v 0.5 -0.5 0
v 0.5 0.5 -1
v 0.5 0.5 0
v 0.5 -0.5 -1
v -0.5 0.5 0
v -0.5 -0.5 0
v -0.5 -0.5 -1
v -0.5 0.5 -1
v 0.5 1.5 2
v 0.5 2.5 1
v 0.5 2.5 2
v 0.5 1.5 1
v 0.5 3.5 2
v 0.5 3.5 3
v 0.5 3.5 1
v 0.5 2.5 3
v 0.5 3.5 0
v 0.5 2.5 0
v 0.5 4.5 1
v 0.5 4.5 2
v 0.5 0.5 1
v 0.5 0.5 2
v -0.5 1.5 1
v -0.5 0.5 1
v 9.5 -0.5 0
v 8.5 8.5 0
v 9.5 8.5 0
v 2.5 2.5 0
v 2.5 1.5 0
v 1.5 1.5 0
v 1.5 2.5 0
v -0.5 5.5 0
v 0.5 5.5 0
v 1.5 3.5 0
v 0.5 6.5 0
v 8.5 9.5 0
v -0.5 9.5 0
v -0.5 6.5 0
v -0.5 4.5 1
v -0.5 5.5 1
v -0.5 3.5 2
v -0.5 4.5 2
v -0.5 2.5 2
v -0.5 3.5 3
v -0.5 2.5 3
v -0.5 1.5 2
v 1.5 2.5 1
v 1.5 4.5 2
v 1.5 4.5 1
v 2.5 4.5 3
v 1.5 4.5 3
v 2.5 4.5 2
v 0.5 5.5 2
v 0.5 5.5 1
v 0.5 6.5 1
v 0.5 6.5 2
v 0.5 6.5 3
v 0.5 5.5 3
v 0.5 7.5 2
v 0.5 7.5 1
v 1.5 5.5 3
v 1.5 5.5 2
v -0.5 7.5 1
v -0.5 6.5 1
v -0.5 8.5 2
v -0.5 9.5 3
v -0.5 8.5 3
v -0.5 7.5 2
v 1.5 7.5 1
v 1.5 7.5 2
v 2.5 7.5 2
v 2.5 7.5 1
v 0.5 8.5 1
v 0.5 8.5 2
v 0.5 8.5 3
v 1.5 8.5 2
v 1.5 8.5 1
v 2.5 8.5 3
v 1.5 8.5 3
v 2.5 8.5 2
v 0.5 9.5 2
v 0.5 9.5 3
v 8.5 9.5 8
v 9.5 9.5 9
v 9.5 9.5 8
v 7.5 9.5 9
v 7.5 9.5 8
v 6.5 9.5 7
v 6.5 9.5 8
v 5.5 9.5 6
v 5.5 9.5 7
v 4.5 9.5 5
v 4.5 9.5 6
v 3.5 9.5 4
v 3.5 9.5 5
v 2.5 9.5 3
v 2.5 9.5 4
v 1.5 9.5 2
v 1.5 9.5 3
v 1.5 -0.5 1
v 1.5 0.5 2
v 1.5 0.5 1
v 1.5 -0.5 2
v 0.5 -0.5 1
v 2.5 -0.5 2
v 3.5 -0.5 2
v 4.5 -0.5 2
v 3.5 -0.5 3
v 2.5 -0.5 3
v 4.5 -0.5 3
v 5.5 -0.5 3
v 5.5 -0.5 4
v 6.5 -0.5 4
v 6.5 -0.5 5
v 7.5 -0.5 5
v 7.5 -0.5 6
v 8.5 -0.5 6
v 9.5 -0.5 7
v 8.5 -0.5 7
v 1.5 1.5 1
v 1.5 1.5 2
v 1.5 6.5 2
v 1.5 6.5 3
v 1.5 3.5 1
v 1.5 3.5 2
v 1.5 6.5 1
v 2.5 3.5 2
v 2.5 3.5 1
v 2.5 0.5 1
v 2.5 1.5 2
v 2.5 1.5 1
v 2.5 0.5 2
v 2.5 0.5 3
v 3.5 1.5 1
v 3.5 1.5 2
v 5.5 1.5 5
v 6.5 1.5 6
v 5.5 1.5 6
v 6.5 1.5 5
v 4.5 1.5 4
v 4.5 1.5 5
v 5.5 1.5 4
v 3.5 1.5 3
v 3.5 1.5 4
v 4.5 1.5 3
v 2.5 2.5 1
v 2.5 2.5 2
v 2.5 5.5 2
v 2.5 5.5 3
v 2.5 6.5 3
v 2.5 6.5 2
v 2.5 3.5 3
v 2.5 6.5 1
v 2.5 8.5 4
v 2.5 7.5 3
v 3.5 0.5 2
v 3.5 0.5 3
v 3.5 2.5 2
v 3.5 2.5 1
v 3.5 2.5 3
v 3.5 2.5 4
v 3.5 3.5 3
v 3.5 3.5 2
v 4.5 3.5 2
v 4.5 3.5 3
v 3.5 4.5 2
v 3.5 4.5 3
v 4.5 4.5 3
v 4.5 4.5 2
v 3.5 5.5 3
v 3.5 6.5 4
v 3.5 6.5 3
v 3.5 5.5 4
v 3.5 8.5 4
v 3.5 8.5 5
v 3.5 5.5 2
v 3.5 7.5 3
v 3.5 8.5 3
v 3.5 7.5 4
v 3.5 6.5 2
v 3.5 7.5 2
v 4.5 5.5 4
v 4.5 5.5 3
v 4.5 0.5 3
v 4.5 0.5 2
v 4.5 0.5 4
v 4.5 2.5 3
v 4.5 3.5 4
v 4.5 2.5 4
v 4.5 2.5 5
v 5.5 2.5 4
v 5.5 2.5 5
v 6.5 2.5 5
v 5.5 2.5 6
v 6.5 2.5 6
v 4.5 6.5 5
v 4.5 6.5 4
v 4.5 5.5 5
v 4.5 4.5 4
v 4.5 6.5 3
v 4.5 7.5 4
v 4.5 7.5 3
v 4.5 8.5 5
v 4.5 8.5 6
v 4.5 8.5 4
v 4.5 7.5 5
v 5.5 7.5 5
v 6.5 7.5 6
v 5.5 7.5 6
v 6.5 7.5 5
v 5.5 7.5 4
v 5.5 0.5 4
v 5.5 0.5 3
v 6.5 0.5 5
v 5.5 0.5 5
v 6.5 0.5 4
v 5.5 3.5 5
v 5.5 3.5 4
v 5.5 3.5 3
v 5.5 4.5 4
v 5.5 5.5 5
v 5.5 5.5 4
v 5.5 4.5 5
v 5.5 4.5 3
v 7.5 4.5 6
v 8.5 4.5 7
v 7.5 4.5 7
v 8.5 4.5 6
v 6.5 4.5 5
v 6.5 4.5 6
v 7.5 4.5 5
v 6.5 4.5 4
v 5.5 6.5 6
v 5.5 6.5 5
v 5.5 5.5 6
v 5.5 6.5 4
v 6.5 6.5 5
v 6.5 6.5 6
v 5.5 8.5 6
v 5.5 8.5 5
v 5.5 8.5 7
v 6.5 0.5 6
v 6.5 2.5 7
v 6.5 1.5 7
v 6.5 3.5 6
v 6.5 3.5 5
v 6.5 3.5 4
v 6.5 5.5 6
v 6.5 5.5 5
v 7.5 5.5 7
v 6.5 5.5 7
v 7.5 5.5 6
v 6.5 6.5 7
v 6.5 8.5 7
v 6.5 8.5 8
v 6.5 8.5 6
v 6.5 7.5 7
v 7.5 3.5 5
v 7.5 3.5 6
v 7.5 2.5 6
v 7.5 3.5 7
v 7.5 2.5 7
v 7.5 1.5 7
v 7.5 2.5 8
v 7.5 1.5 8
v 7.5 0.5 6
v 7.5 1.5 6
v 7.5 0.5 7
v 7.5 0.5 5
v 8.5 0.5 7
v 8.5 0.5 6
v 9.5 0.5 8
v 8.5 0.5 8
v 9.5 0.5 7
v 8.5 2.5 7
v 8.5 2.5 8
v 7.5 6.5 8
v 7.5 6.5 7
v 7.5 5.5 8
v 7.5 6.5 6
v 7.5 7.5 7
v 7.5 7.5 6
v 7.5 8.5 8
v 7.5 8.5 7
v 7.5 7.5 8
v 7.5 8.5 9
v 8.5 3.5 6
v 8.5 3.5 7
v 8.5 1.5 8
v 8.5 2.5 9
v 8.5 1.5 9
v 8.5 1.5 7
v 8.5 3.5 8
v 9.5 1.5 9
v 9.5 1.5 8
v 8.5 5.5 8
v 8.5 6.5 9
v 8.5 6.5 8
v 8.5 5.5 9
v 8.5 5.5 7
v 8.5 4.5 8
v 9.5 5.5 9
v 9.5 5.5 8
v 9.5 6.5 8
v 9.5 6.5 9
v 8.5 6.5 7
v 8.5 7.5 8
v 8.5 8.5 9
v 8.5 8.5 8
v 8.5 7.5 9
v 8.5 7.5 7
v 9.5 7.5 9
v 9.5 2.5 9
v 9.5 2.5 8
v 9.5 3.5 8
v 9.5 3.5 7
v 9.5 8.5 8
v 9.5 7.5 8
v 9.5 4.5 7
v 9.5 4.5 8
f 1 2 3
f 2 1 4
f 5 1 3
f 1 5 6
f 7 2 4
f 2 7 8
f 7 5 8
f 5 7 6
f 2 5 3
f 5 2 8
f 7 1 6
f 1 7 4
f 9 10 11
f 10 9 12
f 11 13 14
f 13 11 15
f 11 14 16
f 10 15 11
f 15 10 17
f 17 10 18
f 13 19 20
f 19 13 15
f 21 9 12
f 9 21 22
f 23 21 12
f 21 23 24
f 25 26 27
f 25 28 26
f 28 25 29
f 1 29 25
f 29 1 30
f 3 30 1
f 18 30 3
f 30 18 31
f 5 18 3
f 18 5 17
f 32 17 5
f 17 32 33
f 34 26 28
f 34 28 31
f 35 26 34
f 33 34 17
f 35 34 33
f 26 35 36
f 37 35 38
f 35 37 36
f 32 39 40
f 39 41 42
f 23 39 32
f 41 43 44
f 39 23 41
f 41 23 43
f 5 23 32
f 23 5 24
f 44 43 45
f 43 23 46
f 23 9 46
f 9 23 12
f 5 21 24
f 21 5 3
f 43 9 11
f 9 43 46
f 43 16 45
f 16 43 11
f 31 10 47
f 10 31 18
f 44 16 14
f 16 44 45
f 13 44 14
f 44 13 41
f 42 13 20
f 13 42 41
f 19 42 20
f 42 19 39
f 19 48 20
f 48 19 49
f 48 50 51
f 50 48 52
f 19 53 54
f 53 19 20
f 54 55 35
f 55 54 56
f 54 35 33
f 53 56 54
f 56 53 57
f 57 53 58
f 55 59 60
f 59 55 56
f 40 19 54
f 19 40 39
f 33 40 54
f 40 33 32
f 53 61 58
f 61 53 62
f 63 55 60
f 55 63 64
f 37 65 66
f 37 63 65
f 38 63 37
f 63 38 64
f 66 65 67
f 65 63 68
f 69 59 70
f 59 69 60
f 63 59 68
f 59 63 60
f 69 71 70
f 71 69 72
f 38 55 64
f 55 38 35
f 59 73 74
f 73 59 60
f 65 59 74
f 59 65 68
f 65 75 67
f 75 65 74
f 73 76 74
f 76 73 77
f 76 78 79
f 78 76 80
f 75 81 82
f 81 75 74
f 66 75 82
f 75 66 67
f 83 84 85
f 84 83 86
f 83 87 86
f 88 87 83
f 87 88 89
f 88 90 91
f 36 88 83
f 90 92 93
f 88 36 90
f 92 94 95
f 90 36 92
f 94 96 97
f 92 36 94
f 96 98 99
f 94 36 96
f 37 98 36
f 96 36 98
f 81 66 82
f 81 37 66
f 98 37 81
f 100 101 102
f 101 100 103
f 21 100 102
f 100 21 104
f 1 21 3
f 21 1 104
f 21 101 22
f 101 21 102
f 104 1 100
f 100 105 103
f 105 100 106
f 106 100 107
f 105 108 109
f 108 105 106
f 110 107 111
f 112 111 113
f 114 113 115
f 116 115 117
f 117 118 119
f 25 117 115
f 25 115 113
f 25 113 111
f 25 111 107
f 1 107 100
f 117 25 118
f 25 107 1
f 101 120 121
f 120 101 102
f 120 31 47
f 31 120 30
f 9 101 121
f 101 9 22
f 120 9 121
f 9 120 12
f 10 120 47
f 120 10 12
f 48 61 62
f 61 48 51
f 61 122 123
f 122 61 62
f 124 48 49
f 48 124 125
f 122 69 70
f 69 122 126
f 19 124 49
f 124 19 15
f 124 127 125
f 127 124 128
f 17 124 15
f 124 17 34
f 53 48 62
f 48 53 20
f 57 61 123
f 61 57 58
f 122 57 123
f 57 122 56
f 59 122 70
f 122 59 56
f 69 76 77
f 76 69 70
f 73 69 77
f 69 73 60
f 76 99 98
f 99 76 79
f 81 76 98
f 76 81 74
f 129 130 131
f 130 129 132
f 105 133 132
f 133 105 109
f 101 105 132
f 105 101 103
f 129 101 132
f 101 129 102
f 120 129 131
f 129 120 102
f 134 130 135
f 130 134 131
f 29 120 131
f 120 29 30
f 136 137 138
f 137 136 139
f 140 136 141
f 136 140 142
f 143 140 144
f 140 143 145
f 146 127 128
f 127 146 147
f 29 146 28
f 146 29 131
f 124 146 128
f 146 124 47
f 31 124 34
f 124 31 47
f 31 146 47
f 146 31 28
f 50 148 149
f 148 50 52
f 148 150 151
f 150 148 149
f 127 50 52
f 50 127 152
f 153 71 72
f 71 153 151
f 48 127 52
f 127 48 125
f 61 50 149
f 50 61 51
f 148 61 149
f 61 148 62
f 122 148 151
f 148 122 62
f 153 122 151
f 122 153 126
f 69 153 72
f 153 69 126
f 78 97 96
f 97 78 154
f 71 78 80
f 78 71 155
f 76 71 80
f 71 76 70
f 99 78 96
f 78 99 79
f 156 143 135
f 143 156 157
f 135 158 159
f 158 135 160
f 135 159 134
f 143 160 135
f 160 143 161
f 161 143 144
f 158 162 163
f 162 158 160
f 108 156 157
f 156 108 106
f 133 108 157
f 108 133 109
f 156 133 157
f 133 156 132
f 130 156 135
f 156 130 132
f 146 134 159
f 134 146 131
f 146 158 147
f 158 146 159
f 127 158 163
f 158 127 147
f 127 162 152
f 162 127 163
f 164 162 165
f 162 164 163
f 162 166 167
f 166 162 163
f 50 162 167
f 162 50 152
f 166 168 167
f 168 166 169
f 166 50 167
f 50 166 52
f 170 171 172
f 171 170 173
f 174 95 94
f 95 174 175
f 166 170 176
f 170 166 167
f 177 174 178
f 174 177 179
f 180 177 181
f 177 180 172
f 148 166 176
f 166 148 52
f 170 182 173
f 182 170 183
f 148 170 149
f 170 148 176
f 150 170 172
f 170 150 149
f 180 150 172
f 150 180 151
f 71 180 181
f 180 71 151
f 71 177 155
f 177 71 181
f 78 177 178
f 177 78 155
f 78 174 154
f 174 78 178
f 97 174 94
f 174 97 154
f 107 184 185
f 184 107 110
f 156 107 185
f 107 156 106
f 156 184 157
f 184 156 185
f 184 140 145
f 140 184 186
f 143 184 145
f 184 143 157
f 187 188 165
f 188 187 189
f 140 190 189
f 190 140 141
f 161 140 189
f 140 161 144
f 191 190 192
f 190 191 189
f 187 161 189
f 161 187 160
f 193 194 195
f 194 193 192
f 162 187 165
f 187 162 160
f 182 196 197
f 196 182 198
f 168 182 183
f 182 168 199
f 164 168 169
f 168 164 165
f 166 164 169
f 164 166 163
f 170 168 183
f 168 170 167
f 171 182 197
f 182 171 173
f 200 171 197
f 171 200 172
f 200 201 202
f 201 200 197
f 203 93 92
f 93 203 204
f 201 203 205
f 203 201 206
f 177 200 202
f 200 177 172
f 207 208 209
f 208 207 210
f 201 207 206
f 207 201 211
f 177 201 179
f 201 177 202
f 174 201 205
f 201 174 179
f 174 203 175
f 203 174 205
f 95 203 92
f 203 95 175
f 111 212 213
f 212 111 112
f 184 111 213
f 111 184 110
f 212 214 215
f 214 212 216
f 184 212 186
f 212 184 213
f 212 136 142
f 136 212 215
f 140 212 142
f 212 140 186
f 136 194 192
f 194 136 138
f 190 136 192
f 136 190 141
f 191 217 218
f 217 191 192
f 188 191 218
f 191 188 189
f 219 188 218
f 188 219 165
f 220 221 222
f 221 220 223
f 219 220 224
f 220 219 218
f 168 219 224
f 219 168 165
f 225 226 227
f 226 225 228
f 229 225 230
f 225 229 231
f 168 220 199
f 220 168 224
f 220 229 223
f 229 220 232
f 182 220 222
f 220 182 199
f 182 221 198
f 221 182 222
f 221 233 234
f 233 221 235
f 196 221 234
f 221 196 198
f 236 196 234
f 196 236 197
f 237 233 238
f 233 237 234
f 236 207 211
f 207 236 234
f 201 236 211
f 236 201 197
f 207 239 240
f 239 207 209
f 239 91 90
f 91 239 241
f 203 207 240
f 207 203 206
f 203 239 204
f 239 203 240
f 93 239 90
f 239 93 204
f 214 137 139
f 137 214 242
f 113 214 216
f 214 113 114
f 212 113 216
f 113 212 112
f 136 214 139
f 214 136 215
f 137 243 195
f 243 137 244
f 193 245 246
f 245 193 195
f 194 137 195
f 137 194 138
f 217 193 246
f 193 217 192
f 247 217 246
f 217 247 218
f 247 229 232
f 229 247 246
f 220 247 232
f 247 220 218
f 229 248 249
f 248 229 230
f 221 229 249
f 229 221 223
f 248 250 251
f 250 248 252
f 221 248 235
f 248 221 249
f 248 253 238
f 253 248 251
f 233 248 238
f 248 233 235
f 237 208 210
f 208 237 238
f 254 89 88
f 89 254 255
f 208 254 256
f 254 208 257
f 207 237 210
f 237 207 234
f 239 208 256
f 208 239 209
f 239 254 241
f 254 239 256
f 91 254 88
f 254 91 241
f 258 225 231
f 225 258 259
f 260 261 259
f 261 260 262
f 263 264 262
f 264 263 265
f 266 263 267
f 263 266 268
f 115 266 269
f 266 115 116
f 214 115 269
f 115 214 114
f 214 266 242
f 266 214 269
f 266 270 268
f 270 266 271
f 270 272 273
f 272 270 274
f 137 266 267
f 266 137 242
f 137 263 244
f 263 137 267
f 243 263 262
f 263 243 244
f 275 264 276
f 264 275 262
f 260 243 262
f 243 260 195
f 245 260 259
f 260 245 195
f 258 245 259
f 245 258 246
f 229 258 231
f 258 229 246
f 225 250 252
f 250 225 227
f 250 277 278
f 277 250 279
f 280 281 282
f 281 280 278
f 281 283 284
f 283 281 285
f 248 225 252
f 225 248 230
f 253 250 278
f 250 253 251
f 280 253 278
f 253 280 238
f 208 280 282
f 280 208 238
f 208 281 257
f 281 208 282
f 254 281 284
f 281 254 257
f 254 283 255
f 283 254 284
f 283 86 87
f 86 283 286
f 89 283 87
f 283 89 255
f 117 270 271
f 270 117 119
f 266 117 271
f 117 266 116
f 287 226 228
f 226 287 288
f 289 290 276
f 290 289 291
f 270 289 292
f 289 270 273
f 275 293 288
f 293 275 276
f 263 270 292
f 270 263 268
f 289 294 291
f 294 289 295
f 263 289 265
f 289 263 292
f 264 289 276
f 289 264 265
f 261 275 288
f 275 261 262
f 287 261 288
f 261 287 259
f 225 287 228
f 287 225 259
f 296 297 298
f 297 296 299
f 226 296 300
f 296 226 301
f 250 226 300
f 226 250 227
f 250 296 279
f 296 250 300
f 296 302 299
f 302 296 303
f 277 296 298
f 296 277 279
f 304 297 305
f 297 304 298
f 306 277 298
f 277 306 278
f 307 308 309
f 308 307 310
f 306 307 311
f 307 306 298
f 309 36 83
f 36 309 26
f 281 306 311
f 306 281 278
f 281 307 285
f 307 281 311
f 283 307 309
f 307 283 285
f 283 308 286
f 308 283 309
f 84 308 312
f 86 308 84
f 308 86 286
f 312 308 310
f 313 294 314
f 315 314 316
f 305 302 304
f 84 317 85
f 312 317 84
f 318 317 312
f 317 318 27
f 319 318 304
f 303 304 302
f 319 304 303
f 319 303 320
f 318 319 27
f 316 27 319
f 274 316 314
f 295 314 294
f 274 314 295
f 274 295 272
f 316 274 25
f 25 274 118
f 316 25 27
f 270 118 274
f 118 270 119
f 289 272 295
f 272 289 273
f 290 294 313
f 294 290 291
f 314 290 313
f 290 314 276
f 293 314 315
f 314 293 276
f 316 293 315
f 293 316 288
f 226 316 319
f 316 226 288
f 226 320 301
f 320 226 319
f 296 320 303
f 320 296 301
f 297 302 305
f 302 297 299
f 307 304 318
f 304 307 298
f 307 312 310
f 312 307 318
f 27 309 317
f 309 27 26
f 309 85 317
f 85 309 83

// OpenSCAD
union() {
    translate([0, 0, -0.5]) color([1, 0, 0]) cube([1, 1, 1], center=true);
    translate([0, 1, 0.5]) cube([1, 1, 1], center=true);
    translate([0, 2, 1.0]) cube([1, 1, 2], center=true);
    translate([0, 3, 1.5]) cube([1, 1, 3], center=true);
    translate([0, 4, 1.0]) cube([1, 1, 2], center=true);
    translate([0, 5, 0.5]) cube([1, 1, 1], center=true);
    translate([0, 7, 0.5]) cube([1, 1, 1], center=true);
    translate([0, 8, 1.0]) cube([1, 1, 2], center=true);
    translate([0, 9, 1.5]) cube([1, 1, 3], center=true);
    translate([1, 0, 0.5]) cube([1, 1, 1], center=true);
    translate([1, 1, 1.0]) cube([1, 1, 2], center=true);
    translate([1, 2, 0.5]) cube([1, 1, 1], center=true);
    translate([1, 4, 0.5]) cube([1, 1, 1], center=true);
    translate([1, 5, 1.0]) cube([1, 1, 2], center=true);
    translate([1, 6, 1.5]) cube([1, 1, 3], center=true);
    translate([1, 7, 1.0]) cube([1, 1, 2], center=true);
    translate([1, 8, 0.5]) cube([1, 1, 1], center=true);
    translate([1, 9, 1.0]) cube([1, 1, 2], center=true);
    translate([2, 0, 1.0]) cube([1, 1, 2], center=true);
    translate([2, 1, 0.5]) cube([1, 1, 1], center=true);
    translate([2, 3, 0.5]) cube([1, 1, 1], center=true);
    translate([2, 4, 1.0]) cube([1, 1, 2], center=true);
    translate([2, 5, 1.5]) cube([1, 1, 3], center=true);
    translate([2, 6, 1.0]) cube([1, 1, 2], center=true);
    translate([2, 7, 0.5]) cube([1, 1, 1], center=true);
    translate([2, 8, 1.0]) cube([1, 1, 2], center=true);
    translate([2, 9, 1.5]) cube([1, 1, 3], center=true);
    translate([3, 0, 1.5]) cube([1, 1, 3], center=true);
    translate([3, 1, 1.0]) cube([1, 1, 2], center=true);
    translate([3, 2, 0.5]) cube([1, 1, 1], center=true);
    translate([3, 3, 1.0]) cube([1, 1, 2], center=true);
    translate([3, 4, 1.5]) cube([1, 1, 3], center=true);
    translate([3, 5, 1.0]) cube([1, 1, 2], center=true);
    translate([3, 6, 1.5]) cube([1, 1, 3], center=true);
    translate([3, 7, 1.0]) cube([1, 1, 2], center=true);
    translate([3, 8, 1.5]) cube([1, 1, 3], center=true);
    translate([3, 9, 2.0]) cube([1, 1, 4], center=true);
    translate([4, 0, 1.0]) cube([1, 1, 2], center=true);
    translate([4, 1, 1.5]) cube([1, 1, 3], center=true);
    translate([4, 2, 2.0]) cube([1, 1, 4], center=true);
    translate([4, 3, 1.5]) cube([1, 1, 3], center=true);
    translate([4, 4, 1.0]) cube([1, 1, 2], center=true);
    translate([4, 5, 1.5]) cube([1, 1, 3], center=true);
    translate([4, 6, 2.0]) cube([1, 1, 4], center=true);
    translate([4, 7, 1.5]) cube([1, 1, 3], center=true);
    translate([4, 8, 2.0]) cube([1, 1, 4], center=true);
    translate([4, 9, 2.5]) cube([1, 1, 5], center=true);
    translate([5, 0, 1.5]) cube([1, 1, 3], center=true);
    translate([5, 1, 2.0]) cube([1, 1, 4], center=true);
    translate([5, 2, 2.5]) cube([1, 1, 5], center=true);
    translate([5, 3, 2.0]) cube([1, 1, 4], center=true);
    translate([5, 4, 1.5]) cube([1, 1, 3], center=true);
    translate([5, 5, 2.0]) cube([1, 1, 4], center=true);
    translate([5, 6, 2.5]) cube([1, 1, 5], center=true);
    translate([5, 7, 2.0]) cube([1, 1, 4], center=true);
    translate([5, 8, 2.5]) cube([1, 1, 5], center=true);
    translate([5, 9, 3.0]) cube([1, 1, 6], center=true);
    translate([6, 0, 2.0]) cube([1, 1, 4], center=true);
    translate([6, 1, 2.5]) cube([1, 1, 5], center=true);
    translate([6, 2, 3.0]) cube([1, 1, 6], center=true);
    translate([6, 3, 2.5]) cube([1, 1, 5], center=true);
    translate([6, 4, 2.0]) cube([1, 1, 4], center=true);
    translate([6, 5, 2.5]) cube([1, 1, 5], center=true);
    translate([6, 6, 3.0]) cube([1, 1, 6], center=true);
    translate([6, 7, 2.5]) cube([1, 1, 5], center=true);
    translate([6, 8, 3.0]) cube([1, 1, 6], center=true);
    translate([6, 9, 3.5]) cube([1, 1, 7], center=true);
    translate([7, 0, 2.5]) cube([1, 1, 5], center=true);
    translate([7, 1, 3.0]) cube([1, 1, 6], center=true);
    translate([7, 2, 3.5]) cube([1, 1, 7], center=true);
    translate([7, 3, 3.0]) cube([1, 1, 6], center=true);
    translate([7, 4, 2.5]) cube([1, 1, 5], center=true);
    translate([7, 5, 3.0]) cube([1, 1, 6], center=true);
    translate([7, 6, 3.5]) cube([1, 1, 7], center=true);
    translate([7, 7, 3.0]) cube([1, 1, 6], center=true);
    translate([7, 8, 3.5]) cube([1, 1, 7], center=true);
    translate([7, 9, 4.0]) cube([1, 1, 8], center=true);
    translate([8, 0, 3.0]) cube([1, 1, 6], center=true);
    translate([8, 1, 3.5]) cube([1, 1, 7], center=true);
    translate([8, 2, 4.0]) cube([1, 1, 8], center=true);
    translate([8, 3, 3.5]) cube([1, 1, 7], center=true);
    translate([8, 4, 3.0]) cube([1, 1, 6], center=true);
    translate([8, 5, 3.5]) cube([1, 1, 7], center=true);
    translate([8, 6, 4.0]) cube([1, 1, 8], center=true);
    translate([8, 7, 3.5]) cube([1, 1, 7], center=true);
    translate([8, 8, 4.0]) cube([1, 1, 8], center=true);
    translate([8, 9, 4.5]) cube([1, 1, 9], center=true);
    translate([9, 0, 3.5]) cube([1, 1, 7], center=true);
    translate([9, 1, 4.0]) cube([1, 1, 8], center=true);
    translate([9, 2, 4.5]) cube([1, 1, 9], center=true);
    translate([9, 3, 4.0]) cube([1, 1, 8], center=true);
    translate([9, 4, 3.5]) cube([1, 1, 7], center=true);
    translate([9, 5, 4.0]) cube([1, 1, 8], center=true);
    translate([9, 6, 4.5]) cube([1, 1, 9], center=true);
    translate([9, 7, 4.0]) cube([1, 1, 8], center=true);
    translate([9, 8, 4.5]) cube([1, 1, 9], center=true);
    translate([9, 9, 8.5]) color([0, 0, 1]) cube([1, 1, 1], center=true);
}
